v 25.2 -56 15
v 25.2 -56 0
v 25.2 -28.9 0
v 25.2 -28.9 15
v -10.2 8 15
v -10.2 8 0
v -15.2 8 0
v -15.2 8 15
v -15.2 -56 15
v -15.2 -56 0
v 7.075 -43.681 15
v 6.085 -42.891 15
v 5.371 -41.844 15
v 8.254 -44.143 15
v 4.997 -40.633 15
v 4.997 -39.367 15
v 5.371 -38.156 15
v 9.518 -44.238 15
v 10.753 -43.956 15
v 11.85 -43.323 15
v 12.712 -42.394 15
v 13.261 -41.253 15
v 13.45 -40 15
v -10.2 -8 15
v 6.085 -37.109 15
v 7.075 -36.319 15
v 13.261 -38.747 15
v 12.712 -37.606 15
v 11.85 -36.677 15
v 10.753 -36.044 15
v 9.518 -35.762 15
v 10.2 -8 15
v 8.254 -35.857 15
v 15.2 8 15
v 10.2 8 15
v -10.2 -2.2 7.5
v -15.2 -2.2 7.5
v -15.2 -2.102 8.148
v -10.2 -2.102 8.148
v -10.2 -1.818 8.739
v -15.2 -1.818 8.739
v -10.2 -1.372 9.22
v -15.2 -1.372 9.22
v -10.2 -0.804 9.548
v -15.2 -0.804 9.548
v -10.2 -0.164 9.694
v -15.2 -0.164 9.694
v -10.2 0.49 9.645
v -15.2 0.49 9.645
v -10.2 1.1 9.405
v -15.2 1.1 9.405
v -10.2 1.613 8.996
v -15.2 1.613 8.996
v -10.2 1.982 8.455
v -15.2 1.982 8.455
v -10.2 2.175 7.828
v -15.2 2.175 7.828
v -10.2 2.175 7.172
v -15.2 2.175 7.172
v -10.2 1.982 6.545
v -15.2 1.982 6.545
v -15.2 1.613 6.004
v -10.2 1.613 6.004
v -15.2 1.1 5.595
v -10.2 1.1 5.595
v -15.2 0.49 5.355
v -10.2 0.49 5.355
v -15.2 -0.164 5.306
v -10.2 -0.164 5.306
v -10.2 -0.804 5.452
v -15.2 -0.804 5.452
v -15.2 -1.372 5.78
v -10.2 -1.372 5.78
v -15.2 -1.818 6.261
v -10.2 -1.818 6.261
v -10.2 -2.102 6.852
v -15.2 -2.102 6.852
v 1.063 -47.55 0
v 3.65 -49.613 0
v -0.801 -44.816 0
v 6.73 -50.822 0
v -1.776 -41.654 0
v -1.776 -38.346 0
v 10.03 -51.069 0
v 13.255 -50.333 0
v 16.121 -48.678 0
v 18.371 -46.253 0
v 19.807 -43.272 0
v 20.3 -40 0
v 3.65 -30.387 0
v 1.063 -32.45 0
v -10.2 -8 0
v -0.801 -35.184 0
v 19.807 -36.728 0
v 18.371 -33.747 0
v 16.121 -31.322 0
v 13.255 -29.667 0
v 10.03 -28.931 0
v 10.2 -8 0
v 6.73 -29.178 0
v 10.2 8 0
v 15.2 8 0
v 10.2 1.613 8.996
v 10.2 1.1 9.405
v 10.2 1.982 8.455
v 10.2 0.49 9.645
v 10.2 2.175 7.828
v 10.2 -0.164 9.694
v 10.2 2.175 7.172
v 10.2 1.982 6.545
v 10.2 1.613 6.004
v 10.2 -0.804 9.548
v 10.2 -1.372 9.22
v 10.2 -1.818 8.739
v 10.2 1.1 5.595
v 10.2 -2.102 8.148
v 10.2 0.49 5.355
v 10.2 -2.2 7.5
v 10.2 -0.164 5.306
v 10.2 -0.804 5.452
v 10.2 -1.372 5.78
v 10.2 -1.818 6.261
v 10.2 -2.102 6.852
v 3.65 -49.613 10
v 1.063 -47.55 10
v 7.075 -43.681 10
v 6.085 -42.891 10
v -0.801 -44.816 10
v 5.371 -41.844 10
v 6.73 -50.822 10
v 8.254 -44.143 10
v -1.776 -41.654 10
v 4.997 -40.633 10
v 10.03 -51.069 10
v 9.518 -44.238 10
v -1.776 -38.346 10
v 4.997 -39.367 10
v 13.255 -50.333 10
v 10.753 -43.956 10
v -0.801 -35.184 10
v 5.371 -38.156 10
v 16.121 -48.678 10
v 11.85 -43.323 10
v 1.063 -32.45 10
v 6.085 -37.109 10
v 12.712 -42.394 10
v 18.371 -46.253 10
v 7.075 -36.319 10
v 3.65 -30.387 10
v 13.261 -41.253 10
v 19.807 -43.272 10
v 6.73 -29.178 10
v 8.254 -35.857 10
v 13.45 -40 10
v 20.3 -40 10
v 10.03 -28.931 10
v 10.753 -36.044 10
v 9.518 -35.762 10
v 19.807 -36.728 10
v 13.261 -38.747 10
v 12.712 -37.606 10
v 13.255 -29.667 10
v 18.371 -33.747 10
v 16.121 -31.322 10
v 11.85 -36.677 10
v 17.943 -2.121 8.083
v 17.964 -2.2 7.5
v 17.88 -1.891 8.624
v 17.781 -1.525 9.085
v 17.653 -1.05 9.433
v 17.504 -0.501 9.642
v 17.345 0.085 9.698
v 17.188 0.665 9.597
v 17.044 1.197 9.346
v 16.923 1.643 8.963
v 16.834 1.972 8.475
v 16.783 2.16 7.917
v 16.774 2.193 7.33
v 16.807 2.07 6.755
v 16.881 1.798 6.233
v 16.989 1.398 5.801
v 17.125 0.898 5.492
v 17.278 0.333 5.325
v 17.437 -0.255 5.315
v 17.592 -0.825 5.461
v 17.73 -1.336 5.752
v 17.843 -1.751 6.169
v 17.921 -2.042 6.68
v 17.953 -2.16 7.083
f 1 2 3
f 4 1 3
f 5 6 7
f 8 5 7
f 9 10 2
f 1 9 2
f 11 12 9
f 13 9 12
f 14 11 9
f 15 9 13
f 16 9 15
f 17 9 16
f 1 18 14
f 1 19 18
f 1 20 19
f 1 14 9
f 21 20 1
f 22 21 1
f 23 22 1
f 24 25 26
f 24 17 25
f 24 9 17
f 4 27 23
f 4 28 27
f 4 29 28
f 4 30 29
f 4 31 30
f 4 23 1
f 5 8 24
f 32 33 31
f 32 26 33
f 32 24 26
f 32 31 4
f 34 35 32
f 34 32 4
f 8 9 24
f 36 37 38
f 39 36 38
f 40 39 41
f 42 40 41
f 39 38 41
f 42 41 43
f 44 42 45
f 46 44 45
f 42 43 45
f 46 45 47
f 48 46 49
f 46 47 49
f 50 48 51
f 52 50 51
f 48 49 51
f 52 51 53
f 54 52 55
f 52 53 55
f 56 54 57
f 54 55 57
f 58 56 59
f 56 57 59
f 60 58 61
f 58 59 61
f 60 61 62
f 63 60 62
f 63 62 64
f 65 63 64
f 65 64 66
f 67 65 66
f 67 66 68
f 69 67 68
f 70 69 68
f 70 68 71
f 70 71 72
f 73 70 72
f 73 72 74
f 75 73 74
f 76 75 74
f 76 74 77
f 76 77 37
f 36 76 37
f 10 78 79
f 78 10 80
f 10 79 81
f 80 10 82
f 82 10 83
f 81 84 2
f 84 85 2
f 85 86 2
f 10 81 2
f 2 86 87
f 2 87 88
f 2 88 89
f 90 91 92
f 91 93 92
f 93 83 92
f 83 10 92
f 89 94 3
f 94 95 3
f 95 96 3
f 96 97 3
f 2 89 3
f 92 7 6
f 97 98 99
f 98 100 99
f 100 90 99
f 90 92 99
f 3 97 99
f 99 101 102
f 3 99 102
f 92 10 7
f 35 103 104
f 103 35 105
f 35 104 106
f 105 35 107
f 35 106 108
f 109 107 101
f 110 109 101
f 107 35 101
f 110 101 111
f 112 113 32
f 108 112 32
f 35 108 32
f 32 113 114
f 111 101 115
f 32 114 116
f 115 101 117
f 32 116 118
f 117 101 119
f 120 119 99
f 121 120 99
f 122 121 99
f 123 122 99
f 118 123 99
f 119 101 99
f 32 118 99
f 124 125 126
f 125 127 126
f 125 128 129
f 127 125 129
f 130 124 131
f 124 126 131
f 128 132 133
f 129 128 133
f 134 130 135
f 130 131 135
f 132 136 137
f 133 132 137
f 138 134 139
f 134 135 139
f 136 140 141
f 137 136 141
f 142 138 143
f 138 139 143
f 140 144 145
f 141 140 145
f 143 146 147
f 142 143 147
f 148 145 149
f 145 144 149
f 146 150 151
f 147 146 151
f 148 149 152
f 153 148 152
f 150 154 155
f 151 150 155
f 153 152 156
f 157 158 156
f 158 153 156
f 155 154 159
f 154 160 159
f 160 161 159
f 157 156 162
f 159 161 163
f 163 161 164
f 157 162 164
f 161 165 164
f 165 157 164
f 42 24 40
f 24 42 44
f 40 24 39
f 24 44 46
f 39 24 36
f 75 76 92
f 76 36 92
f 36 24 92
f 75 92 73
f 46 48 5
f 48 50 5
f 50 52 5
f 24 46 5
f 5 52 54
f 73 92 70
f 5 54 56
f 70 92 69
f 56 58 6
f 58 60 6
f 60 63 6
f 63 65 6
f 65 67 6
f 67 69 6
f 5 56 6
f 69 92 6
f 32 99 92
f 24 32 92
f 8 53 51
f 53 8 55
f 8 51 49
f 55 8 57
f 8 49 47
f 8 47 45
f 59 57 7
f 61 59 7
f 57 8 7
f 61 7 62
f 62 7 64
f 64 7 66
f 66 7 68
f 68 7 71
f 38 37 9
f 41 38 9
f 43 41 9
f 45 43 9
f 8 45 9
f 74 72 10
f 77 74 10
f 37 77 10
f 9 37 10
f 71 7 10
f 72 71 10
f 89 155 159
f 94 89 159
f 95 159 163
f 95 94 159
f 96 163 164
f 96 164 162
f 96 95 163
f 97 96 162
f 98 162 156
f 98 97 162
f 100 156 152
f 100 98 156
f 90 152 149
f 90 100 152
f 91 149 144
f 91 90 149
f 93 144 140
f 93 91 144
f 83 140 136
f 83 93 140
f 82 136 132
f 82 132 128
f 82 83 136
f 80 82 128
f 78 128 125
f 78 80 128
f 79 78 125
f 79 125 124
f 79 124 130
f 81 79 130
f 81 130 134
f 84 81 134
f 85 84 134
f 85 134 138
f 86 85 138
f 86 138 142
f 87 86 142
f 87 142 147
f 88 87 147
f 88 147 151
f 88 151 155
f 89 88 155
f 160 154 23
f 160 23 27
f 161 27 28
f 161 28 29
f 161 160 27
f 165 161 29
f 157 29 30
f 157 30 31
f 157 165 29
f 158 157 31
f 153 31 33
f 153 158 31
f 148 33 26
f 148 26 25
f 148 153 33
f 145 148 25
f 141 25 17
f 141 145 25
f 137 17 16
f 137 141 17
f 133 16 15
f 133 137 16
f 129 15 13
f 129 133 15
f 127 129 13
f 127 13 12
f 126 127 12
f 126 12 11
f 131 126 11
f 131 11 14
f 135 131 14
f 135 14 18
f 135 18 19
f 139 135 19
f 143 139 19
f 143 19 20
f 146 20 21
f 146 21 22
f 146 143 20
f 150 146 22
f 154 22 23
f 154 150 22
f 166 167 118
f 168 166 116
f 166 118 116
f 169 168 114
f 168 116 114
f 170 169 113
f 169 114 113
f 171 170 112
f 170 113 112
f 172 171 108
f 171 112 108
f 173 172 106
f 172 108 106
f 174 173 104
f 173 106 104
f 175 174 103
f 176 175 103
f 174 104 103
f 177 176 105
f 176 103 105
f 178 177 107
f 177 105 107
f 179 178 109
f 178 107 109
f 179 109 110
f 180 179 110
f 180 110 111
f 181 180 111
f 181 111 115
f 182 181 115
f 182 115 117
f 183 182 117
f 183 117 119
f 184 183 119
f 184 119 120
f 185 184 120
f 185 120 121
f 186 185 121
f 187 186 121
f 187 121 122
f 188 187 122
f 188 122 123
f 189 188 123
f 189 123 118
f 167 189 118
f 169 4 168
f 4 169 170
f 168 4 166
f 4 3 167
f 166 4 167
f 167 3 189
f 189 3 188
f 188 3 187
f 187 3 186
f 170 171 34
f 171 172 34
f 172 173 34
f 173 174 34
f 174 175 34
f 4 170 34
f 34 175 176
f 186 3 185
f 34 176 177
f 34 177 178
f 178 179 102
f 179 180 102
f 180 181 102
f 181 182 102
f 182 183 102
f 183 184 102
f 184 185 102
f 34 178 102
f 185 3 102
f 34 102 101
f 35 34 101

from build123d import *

# Parameters (mm, degrees)
SZKIC1_R                    = 11.1
DODANIE_WYCI_GNI_CIE1_DEPTH = 15
DODANIE_WYCI_GNI_CIE2_START = -5
SZKIC2_R                    = 11.1
SZKIC2_R_2                  = 4.25
DODANIE_WYCI_GNI_CIE2_DEPTH = 5
SZKIC3_R                    = 2.2
WYTNIJ_WYCI_GNI_CIE1_DEPTH  = 71.662295462


with BuildPart() as part:
    # Szkic1 → Dodanie-wyciągnięcie1 (new body)
    with BuildSketch(Plane.XY):
        Polygon((25.2, -56), (25.2, -28.9), (15.2, 8), (10.2, 8), (10.2, -8), (-10.2, -8), (-10.2, 8), (-15.2, 8), (-15.2, -56), align=None)
        with Locations((9.2, -40)):
            Circle(SZKIC1_R, mode=Mode.SUBTRACT)
    extrude(amount=DODANIE_WYCI_GNI_CIE1_DEPTH)

    # Szkic2 → Dodanie-wyciągnięcie2 (add)
    with BuildSketch(Plane.XY.offset(15).offset(DODANIE_WYCI_GNI_CIE2_START)):
        with Locations((9.2, -40)):
            Circle(SZKIC2_R)
        with Locations((9.2, -40)):
            Circle(SZKIC2_R_2, mode=Mode.SUBTRACT)
    extrude(amount=DODANIE_WYCI_GNI_CIE2_DEPTH)

    # Szkic3 → Wytnij-wyciągnięcie1 (cut, through all)
    with BuildSketch(Plane.ZY.offset(15.2)):
        with Locations(Location((7.5, 0, 0), (0, 0, 270))):
            Circle(SZKIC3_R)
    extrude(amount=-WYTNIJ_WYCI_GNI_CIE1_DEPTH, mode=Mode.SUBTRACT)


solid = part.part
